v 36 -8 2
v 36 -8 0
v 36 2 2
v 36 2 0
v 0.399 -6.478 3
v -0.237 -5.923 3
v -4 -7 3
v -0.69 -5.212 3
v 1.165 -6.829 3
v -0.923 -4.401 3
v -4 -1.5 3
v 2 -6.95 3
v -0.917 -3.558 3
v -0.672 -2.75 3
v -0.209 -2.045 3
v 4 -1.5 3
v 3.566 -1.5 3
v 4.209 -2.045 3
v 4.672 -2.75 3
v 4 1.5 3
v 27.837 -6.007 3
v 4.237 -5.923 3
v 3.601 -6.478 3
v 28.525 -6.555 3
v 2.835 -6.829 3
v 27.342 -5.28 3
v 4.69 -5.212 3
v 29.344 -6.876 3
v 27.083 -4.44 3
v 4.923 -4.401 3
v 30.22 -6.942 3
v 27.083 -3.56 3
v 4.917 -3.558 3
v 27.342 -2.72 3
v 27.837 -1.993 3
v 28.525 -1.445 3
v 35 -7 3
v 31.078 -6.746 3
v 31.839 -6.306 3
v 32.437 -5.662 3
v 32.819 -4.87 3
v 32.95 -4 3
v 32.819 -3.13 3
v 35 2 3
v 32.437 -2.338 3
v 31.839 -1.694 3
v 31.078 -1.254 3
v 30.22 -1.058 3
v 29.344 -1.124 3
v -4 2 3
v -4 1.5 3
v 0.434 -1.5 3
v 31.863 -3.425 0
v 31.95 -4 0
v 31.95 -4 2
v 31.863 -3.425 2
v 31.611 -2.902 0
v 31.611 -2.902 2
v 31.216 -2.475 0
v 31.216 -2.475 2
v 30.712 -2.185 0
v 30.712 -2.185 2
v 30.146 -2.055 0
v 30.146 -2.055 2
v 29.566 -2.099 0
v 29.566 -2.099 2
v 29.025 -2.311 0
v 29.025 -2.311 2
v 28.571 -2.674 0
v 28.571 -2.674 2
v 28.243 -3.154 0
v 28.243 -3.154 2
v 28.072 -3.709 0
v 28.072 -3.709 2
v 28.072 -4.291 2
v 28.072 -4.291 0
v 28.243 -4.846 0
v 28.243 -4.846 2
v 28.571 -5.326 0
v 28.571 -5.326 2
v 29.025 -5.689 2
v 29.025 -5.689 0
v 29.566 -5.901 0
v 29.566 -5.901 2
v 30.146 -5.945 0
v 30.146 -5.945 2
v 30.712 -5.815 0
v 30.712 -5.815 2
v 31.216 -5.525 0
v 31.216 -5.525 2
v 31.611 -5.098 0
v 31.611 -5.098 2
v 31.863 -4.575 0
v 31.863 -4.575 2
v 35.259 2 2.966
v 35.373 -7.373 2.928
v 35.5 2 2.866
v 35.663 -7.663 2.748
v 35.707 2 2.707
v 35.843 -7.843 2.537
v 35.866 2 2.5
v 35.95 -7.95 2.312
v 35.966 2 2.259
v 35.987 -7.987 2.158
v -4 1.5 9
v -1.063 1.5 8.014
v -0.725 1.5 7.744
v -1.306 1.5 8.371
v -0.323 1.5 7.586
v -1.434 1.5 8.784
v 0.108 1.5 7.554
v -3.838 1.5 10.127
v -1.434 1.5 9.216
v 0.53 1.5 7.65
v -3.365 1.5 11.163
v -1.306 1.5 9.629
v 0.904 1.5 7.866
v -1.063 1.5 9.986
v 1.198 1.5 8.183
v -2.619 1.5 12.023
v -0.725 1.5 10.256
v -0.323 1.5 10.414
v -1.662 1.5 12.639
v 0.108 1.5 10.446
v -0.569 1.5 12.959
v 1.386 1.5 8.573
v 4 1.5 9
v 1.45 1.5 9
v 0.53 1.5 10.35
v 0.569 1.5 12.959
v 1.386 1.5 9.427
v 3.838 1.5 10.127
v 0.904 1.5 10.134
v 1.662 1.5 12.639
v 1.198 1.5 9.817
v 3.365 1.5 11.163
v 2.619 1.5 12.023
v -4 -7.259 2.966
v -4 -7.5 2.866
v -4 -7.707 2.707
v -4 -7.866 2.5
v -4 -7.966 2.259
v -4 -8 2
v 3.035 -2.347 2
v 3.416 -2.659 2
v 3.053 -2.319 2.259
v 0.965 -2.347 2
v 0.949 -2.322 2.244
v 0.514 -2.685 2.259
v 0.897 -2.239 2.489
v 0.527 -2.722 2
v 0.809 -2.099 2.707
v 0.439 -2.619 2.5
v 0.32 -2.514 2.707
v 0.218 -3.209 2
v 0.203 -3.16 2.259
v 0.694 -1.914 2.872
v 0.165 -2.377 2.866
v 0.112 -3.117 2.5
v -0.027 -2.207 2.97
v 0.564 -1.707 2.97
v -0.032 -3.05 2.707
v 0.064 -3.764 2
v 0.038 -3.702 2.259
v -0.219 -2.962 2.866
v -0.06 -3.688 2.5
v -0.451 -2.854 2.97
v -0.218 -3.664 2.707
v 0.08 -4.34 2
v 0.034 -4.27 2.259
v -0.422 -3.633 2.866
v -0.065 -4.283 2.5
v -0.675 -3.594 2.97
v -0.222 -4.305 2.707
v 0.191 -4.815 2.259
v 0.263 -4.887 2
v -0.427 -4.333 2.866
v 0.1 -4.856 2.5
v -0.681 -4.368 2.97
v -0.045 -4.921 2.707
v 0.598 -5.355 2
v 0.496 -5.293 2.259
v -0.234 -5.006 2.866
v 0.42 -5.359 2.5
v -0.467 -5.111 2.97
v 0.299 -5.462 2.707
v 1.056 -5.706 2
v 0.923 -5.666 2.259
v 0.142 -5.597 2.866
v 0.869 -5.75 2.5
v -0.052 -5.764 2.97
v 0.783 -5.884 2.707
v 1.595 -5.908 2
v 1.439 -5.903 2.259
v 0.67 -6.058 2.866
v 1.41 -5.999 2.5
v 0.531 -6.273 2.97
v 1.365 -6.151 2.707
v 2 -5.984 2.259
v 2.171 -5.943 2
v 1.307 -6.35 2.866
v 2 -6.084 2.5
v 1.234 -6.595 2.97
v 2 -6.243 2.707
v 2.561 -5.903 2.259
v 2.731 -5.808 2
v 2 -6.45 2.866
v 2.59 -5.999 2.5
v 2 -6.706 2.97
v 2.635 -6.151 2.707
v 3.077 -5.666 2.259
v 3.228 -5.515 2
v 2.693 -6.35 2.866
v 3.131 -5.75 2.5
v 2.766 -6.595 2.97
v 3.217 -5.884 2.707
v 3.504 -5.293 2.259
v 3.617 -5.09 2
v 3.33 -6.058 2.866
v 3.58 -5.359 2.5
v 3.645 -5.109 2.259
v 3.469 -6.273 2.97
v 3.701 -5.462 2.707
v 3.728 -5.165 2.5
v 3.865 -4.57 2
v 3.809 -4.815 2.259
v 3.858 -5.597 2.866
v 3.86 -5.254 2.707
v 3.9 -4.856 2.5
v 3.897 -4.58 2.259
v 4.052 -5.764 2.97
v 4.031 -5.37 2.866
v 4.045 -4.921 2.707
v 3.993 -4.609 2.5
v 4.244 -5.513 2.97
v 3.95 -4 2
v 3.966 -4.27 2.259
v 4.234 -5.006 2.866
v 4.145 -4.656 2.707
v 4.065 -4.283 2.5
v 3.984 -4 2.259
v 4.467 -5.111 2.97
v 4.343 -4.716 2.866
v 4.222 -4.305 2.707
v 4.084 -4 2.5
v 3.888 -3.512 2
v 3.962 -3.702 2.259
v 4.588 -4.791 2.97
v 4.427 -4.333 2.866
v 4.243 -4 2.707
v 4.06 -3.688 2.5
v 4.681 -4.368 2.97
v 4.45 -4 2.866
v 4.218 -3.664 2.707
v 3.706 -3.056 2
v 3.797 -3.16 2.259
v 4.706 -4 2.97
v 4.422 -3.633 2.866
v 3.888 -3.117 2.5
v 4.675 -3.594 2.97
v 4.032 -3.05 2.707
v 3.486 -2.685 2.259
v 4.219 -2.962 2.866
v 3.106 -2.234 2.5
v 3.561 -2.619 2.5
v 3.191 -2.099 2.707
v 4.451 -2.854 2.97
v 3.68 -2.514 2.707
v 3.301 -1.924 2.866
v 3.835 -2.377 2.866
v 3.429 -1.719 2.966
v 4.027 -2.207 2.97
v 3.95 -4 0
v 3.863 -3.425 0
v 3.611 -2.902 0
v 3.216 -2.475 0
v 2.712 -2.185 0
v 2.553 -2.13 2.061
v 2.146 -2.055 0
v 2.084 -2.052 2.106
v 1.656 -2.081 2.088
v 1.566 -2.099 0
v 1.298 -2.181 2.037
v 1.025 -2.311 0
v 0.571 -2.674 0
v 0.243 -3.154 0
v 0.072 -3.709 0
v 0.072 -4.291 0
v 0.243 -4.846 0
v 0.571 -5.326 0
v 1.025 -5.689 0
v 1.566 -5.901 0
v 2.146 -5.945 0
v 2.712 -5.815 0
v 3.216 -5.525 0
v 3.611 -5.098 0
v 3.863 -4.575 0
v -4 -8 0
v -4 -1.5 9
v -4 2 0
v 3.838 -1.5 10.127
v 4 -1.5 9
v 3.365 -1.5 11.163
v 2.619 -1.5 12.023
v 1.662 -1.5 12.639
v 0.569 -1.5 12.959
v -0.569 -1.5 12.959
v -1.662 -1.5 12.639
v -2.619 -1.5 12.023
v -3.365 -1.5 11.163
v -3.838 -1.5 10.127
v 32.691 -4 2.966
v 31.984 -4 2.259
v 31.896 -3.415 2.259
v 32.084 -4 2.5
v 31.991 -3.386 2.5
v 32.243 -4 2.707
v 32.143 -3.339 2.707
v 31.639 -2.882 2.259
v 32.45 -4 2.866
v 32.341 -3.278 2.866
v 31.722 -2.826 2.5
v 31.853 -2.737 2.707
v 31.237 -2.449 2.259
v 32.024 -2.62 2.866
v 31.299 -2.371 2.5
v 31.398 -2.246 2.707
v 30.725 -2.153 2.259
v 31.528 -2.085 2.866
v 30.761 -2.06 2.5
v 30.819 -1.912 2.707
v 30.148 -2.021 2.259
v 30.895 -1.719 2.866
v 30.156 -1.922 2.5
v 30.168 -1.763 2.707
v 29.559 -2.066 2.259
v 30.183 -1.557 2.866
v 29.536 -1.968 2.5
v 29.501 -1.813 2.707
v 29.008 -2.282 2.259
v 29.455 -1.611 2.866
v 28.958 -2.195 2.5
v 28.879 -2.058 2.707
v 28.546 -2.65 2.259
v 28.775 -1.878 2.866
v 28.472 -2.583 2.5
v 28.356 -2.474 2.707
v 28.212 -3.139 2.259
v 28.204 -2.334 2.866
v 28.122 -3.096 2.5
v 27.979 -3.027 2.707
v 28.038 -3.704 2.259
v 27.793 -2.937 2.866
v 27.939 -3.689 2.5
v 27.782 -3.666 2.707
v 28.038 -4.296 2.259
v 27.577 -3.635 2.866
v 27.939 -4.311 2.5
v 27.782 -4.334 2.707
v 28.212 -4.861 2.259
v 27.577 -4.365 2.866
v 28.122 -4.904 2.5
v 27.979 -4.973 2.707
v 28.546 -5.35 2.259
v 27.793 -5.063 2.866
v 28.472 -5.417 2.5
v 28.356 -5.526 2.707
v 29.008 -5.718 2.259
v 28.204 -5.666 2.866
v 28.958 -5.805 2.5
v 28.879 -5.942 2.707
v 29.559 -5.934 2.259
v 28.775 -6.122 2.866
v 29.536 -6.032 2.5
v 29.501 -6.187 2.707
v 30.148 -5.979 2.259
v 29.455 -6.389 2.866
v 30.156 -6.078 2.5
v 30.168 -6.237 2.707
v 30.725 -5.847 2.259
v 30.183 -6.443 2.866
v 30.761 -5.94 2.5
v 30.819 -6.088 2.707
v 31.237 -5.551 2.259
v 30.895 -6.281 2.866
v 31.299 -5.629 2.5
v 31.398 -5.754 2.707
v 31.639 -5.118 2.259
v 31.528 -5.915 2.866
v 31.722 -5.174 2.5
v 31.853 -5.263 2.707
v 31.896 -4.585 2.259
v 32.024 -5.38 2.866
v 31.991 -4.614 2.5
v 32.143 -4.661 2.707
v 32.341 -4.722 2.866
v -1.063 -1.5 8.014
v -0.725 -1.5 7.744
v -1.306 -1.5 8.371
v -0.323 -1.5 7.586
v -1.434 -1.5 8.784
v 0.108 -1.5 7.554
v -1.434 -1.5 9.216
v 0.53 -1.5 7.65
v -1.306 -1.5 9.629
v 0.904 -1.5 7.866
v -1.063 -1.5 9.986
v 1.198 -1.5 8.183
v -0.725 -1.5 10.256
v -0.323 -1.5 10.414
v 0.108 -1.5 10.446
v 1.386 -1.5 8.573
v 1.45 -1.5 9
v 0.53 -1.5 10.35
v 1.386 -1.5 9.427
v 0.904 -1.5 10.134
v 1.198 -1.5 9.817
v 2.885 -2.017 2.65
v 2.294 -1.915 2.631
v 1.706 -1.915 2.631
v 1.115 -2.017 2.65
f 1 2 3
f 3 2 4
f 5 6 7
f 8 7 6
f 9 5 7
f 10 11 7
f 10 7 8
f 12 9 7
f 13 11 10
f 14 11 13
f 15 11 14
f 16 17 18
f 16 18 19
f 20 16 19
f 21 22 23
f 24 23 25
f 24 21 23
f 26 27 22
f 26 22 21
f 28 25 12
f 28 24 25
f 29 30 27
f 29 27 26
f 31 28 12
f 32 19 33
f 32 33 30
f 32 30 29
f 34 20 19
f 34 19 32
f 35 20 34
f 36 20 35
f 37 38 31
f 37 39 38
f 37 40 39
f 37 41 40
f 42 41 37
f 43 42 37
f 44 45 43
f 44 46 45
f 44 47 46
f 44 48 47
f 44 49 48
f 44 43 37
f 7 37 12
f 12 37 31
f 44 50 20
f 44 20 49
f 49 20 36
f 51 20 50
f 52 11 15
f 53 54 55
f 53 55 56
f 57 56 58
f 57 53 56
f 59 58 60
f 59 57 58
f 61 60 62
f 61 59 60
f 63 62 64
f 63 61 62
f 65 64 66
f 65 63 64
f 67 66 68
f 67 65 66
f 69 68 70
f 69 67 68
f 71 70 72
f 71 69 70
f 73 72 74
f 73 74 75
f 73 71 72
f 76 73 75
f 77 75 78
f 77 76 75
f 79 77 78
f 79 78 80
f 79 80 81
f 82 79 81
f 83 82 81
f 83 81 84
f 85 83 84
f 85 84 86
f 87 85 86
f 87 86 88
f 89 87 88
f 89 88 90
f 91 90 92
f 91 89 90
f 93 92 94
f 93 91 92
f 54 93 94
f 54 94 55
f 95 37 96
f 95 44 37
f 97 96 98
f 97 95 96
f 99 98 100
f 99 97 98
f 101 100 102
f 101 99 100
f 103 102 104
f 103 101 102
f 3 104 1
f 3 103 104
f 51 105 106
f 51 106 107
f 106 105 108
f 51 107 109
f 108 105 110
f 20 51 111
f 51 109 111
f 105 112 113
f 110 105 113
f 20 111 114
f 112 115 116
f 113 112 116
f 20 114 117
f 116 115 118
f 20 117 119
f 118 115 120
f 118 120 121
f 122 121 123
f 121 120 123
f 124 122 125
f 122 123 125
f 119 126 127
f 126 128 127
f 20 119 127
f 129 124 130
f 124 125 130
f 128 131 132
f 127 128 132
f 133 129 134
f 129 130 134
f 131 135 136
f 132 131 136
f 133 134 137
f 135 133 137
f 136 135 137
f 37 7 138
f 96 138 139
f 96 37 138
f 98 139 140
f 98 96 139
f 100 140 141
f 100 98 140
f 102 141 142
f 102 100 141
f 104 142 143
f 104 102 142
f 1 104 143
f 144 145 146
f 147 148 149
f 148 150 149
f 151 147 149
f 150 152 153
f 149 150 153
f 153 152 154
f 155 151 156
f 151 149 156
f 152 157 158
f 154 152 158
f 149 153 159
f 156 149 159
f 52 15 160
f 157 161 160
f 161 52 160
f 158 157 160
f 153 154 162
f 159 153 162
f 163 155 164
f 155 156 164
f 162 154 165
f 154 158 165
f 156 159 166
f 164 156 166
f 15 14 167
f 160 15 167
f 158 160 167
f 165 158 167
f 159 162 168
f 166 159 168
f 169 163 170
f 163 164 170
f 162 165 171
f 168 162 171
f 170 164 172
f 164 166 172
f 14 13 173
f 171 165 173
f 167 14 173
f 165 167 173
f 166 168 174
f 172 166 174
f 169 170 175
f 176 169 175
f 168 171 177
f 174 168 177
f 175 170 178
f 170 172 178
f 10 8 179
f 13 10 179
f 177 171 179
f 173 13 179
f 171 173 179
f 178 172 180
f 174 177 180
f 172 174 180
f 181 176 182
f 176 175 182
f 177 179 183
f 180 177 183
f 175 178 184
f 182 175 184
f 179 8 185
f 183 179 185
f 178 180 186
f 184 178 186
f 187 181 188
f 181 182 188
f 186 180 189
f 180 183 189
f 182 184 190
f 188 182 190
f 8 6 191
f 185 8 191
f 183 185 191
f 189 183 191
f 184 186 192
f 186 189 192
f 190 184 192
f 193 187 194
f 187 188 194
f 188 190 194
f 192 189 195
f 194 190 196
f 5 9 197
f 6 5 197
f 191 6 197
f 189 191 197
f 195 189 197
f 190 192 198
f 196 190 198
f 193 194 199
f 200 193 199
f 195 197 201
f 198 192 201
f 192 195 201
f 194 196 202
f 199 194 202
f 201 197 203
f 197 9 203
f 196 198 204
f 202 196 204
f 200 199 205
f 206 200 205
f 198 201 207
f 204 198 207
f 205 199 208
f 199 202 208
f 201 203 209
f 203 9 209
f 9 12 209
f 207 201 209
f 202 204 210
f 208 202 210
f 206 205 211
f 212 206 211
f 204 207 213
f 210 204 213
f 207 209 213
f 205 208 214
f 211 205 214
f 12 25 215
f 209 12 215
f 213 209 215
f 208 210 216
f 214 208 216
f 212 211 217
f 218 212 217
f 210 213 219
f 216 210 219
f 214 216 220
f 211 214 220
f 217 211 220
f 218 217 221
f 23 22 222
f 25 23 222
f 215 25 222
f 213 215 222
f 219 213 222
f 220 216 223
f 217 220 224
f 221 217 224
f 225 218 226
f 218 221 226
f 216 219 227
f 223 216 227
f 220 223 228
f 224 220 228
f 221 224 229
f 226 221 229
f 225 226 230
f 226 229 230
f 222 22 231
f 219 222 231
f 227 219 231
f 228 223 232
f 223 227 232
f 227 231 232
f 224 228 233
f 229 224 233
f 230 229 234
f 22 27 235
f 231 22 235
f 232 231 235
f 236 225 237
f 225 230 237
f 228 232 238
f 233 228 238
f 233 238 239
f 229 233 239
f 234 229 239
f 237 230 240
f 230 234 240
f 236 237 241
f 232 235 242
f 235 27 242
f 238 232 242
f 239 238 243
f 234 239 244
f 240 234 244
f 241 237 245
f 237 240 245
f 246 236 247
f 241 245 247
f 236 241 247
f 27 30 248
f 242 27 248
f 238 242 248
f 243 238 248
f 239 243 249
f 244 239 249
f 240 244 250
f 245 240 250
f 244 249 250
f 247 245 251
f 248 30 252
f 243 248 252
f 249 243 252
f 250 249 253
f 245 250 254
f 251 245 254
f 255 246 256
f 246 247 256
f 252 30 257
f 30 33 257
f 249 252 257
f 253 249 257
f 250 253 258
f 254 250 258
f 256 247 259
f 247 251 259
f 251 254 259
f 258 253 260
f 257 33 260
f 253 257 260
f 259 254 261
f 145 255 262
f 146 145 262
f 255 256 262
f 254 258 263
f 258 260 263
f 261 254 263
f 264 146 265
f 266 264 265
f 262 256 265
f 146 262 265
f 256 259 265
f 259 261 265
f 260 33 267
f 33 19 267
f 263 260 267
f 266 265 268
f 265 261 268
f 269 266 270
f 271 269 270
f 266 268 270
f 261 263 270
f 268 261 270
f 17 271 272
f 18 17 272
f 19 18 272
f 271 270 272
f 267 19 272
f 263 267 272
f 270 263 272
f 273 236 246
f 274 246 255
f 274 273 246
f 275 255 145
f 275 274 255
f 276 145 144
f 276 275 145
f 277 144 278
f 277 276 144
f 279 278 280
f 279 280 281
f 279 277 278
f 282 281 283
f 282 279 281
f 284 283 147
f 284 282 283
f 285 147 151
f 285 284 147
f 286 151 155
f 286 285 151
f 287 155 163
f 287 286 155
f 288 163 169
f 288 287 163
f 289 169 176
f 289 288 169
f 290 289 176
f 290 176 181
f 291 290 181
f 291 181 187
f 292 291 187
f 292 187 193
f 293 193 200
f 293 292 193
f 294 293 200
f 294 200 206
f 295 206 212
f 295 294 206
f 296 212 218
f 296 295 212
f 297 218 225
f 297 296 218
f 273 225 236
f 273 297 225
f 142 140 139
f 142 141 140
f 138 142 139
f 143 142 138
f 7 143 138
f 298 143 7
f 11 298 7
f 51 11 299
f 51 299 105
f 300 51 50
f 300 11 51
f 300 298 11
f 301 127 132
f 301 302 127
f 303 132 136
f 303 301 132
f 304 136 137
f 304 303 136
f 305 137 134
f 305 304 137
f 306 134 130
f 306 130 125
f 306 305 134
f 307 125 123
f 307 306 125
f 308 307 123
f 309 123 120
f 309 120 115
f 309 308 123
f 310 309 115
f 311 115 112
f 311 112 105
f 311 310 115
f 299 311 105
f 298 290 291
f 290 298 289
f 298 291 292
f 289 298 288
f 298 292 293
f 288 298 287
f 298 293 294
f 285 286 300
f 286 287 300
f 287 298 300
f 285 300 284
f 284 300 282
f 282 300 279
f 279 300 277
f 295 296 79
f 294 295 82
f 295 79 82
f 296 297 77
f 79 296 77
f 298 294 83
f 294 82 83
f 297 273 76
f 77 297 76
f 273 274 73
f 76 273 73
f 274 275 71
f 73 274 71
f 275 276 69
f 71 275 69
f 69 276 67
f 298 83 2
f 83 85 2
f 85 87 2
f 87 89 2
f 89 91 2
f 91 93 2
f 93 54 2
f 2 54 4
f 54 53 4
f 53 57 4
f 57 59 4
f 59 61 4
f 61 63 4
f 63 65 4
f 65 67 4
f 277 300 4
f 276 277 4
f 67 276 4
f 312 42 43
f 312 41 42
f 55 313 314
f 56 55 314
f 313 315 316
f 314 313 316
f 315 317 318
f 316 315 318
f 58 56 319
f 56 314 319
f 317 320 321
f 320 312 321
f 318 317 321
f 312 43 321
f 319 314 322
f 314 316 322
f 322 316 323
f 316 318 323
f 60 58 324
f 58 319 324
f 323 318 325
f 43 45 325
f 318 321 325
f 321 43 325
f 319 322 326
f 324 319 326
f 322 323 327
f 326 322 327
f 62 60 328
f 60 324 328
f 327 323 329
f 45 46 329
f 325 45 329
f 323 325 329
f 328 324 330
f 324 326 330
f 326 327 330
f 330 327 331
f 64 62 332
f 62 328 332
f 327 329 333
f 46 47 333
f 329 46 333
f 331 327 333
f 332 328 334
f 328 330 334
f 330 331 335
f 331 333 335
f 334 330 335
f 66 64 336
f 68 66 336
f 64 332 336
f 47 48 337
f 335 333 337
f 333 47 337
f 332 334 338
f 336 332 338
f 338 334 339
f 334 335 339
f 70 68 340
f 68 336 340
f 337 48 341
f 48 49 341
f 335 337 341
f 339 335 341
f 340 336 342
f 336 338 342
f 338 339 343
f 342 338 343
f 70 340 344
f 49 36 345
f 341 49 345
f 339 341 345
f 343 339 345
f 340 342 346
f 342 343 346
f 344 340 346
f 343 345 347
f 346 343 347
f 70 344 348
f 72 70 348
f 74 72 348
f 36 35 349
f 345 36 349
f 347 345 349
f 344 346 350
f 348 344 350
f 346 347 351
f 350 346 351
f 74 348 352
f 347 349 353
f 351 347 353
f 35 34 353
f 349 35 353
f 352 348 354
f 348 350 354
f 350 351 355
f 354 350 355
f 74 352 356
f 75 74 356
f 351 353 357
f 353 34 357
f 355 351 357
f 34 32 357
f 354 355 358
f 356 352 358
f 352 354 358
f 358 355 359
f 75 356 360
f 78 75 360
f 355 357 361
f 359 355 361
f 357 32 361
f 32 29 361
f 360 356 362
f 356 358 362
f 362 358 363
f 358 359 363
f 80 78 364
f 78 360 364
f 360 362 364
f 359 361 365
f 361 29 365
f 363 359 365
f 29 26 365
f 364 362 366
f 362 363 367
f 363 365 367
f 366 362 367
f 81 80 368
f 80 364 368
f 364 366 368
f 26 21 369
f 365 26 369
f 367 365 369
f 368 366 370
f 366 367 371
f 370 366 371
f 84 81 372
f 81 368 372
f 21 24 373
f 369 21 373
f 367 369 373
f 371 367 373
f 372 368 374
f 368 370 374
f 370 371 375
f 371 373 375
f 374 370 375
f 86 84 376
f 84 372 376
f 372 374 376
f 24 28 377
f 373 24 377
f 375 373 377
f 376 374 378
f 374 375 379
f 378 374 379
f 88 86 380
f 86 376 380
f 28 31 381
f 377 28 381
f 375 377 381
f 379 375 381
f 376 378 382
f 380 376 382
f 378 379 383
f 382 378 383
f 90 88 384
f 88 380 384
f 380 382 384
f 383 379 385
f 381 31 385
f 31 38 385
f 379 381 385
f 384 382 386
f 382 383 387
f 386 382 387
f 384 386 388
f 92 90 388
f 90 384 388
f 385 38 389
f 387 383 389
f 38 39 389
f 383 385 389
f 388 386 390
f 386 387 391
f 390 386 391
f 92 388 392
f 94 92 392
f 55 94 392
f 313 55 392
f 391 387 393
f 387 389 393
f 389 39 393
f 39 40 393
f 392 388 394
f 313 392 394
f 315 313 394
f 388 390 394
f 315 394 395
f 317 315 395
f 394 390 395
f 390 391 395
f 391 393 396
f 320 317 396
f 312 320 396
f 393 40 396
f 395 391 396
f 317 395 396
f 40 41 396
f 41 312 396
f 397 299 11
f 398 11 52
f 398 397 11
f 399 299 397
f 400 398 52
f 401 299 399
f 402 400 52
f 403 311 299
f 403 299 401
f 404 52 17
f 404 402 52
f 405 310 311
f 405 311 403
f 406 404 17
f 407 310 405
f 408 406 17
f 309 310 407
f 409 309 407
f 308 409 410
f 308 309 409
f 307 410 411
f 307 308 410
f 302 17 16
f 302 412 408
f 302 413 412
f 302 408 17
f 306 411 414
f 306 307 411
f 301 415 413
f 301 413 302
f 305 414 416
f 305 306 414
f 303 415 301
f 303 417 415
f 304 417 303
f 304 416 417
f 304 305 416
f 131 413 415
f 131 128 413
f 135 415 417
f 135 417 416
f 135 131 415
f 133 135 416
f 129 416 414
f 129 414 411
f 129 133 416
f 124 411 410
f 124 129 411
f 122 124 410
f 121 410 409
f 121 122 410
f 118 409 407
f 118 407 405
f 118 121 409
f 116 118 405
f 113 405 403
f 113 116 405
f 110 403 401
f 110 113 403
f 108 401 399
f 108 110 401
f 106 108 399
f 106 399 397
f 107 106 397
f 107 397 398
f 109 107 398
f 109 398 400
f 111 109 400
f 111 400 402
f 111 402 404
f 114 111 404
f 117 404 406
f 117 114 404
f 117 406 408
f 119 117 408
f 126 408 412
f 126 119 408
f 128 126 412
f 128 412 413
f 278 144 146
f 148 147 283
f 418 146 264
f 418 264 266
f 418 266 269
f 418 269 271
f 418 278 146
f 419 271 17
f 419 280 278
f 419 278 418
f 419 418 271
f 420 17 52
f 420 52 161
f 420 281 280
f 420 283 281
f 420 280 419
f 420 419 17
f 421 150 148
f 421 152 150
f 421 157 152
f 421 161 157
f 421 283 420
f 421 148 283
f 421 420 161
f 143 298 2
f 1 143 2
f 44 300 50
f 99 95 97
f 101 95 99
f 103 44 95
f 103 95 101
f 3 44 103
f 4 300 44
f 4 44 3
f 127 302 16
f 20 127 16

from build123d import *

# Parameters (mm, degrees)
SKETCH011_R  = 1.45
PAD009_DEPTH = 1.5
SKETCH010_W  = 40
SKETCH010_H  = 10
SKETCH010_R  = 1.95
PAD010_DEPTH = 3
FILLET_R     = 1
FILLET001_R  = 1


with BuildPart() as part:
    # Sketch011 → Pad009 (new body, symmetric)
    with BuildSketch(Plane.XZ):
        with BuildLine():
            ThreePointArc((4, 9), (0, 13), (-4, 9))
            Line((-4, 0), (-4, 9))
            Line((4, 0), (-4, 0))
            Line((4, 9), (4, 0))
        make_face()
        with Locations((0, 9)):
            Circle(SKETCH011_R, mode=Mode.SUBTRACT)
    extrude(amount=PAD009_DEPTH, both=True)

    # Sketch010 → Pad010 (join)
    with BuildSketch(Plane.XY):
        with Locations((16, -3)):
            Rectangle(SKETCH010_W, SKETCH010_H)
        with Locations((2, -4)):
            Circle(SKETCH010_R, mode=Mode.SUBTRACT)
        with Locations((30, -4)):
            Circle(SKETCH010_R, mode=Mode.SUBTRACT)
    extrude(amount=PAD010_DEPTH)

    # Fillet
    fillet_edges = [part.edges().sort_by_distance(p)[0] for p in [
        (28.05, -4, 3),
        (0.05, -4, 3),
    ]]
    fillet(fillet_edges, radius=FILLET_R)

    # Fillet001
    fillet001_edges = [part.edges().sort_by_distance(p)[0] for p in [
        (16, -8, 3),
        (36, -3, 3),
    ]]
    fillet(fillet001_edges, radius=FILLET001_R)


solid = part.part
